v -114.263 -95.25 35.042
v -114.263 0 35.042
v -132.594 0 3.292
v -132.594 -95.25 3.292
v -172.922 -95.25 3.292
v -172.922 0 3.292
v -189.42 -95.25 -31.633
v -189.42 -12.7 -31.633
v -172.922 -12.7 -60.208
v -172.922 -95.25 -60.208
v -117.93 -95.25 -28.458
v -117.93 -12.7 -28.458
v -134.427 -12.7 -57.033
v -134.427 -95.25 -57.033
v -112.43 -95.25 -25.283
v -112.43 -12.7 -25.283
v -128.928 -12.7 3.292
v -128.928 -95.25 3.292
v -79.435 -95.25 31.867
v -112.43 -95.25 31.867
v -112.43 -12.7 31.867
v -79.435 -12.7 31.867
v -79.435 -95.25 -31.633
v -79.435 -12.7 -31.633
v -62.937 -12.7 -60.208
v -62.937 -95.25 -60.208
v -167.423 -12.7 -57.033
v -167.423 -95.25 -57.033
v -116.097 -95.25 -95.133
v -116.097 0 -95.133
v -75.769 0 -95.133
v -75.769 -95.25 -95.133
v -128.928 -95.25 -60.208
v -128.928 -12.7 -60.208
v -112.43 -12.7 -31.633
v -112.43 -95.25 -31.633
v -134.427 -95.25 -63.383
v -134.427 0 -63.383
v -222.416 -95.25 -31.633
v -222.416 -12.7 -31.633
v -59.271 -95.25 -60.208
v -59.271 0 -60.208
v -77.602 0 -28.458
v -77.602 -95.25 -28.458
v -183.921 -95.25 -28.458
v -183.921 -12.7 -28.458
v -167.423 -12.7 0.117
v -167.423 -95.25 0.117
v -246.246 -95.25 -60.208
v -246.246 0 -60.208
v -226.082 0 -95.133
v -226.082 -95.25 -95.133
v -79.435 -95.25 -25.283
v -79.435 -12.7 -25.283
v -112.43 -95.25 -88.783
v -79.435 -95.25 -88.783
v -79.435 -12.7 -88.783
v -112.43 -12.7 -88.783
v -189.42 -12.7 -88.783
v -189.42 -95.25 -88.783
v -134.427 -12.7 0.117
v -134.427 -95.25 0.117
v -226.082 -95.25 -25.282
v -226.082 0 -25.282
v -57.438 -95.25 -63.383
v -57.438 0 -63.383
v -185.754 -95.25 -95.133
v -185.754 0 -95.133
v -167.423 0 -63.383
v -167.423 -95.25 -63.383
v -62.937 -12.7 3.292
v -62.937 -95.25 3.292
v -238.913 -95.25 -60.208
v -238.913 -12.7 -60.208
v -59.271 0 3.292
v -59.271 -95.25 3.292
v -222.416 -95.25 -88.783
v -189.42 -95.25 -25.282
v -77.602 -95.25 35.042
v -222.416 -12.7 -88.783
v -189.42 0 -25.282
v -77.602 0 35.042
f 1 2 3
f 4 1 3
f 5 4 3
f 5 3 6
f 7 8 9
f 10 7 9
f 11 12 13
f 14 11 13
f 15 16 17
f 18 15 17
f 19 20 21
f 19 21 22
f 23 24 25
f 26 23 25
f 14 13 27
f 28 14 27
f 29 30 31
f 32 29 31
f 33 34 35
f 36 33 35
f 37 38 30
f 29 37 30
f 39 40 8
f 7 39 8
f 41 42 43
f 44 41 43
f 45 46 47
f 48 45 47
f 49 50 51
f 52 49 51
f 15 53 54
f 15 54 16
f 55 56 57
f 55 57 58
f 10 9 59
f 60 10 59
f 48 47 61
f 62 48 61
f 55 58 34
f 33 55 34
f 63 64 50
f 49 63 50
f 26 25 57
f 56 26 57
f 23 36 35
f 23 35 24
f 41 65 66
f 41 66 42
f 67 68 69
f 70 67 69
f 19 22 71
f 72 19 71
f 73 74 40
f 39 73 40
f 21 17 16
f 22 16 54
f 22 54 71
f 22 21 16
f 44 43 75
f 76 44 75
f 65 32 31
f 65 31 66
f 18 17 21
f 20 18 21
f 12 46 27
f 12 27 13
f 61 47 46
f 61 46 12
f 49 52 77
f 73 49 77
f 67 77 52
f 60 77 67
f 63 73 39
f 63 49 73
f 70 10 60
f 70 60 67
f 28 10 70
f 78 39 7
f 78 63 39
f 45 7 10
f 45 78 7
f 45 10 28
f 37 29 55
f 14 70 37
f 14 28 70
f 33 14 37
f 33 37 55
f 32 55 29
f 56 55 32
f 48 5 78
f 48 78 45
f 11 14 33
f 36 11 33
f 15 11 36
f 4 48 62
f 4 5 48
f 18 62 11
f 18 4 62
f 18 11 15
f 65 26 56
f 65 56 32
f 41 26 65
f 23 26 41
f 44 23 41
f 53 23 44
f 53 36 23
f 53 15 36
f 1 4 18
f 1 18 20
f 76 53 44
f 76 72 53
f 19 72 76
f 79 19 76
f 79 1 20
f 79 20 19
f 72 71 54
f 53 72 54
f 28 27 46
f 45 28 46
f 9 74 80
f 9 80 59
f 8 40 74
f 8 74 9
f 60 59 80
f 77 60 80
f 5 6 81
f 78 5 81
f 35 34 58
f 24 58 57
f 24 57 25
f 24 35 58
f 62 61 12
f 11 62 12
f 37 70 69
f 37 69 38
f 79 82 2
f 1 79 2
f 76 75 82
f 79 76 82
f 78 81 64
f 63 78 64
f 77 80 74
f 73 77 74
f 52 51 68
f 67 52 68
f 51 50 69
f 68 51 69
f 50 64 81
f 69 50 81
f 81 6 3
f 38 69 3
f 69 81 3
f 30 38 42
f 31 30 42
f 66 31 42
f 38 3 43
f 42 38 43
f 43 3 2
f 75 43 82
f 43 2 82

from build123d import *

# Parameters (mm, degrees)
F1_DEPTH = 12.7
F2_DEPTH = 95.25


# Not quite as in the source:
# - a feature names something its author has since deleted; it is built from what else it names


with BuildPart() as f1:
    # F0 (on Front) → F1 (new body)
    with BuildSketch(Plane.XZ):
        Polygon((-187.5869779497, -91.9575006988), (-169.2561069029, -60.2075006988), (-187.5869779497, -28.4575006988), (-224.2487200432, -28.4575006988), (-242.57959109, -60.2075006988), (-224.2487200432, -91.9575006988), align=None)
        Polygon((-222.4156329385, -88.7825006988), (-238.9134168806, -60.2075006988), (-222.4156329385, -31.6325006988), (-189.4200650544, -31.6325006988), (-172.9222811123, -60.2075006988), (-189.4200650544, -88.7825006988), align=None, mode=Mode.SUBTRACT)
        Polygon((-59.2708806223, -60.2075006988), (-77.6017516691, -28.4575006988), (-114.2634937626, -28.4575006988), (-132.5943648094, -60.2075006988), (-114.2634937626, -91.9575006988), (-77.6017516691, -91.9575006988), align=None)
        Polygon((-112.4304066579, -88.7825006988), (-128.9281906, -60.2075006988), (-112.4304066579, -31.6325006988), (-79.4348387737, -31.6325006988), (-62.9370548316, -60.2075006988), (-79.4348387737, -88.7825006988), align=None, mode=Mode.SUBTRACT)
        Polygon((-77.6017516691, -28.4575006988), (-59.2708806223, 3.2924993012), (-77.6017516691, 35.0424993012), (-114.2634937626, 35.0424993012), (-132.5943648094, 3.2924993012), (-114.2634937626, -28.4575006988), align=None)
        Polygon((-112.4304066579, -25.2825006988), (-128.9281906, 3.2924993012), (-112.4304066579, 31.8674993012), (-79.4348387737, 31.8674993012), (-62.9370548316, 3.2924993012), (-79.4348387737, -25.2825006988), align=None, mode=Mode.SUBTRACT)
        Polygon((-132.5943648094, -60.2075006988), (-114.2634937626, -28.4575006988), (-132.5943648094, 3.2924993012), (-169.2561069029, 3.2924993012), (-187.5869779497, -28.4575006988), (-169.2561069029, -60.2075006988), align=None)
        Polygon((-167.4230197982, -57.0325006988), (-183.9208037403, -28.4575006988), (-167.4230197982, 0.1174993012), (-134.4274519141, 0.1174993012), (-117.929667972, -28.4575006988), (-134.4274519141, -57.0325006988), align=None, mode=Mode.SUBTRACT)
        Polygon((-222.4156329385, -31.6325006988), (-238.9134168806, -60.2075006988), (-222.4156329385, -88.7825006988), (-189.4200650544, -88.7825006988), (-172.9222811123, -60.2075006988), (-189.4200650544, -31.6325006988), align=None)
        Polygon((-112.4304066579, -31.6325006988), (-128.9281906, -60.2075006988), (-112.4304066579, -88.7825006988), (-79.4348387737, -88.7825006988), (-62.9370548316, -60.2075006988), (-79.4348387737, -31.6325006988), align=None)
        Polygon((-167.4230197982, 0.1174993012), (-183.9208037403, -28.4575006988), (-167.4230197982, -57.0325006988), (-134.4274519141, -57.0325006988), (-117.929667972, -28.4575006988), (-134.4274519141, 0.1174993012), align=None)
        Polygon((-112.4304066579, 31.8674993012), (-128.9281906, 3.2924993012), (-112.4304066579, -25.2825006988), (-79.4348387737, -25.2825006988), (-62.9370548316, 3.2924993012), (-79.4348387737, 31.8674993012), align=None)
    extrude(amount=F1_DEPTH)

    # F0 (on Front) → F2 (join)
    with BuildSketch(Plane.XZ):
        Polygon((-77.6017516691, -28.4575006988), (-59.2708806223, 3.2924993012), (-77.6017516691, 35.0424993012), (-114.2634937626, 35.0424993012), (-132.5943648094, 3.2924993012), (-114.2634937626, -28.4575006988), align=None)
        Polygon((-112.4304066579, -25.2825006988), (-128.9281906, 3.2924993012), (-112.4304066579, 31.8674993012), (-79.4348387737, 31.8674993012), (-62.9370548316, 3.2924993012), (-79.4348387737, -25.2825006988), align=None, mode=Mode.SUBTRACT)
        Polygon((-59.2708806223, -60.2075006988), (-77.6017516691, -28.4575006988), (-114.2634937626, -28.4575006988), (-132.5943648094, -60.2075006988), (-114.2634937626, -91.9575006988), (-77.6017516691, -91.9575006988), align=None)
        Polygon((-112.4304066579, -88.7825006988), (-128.9281906, -60.2075006988), (-112.4304066579, -31.6325006988), (-79.4348387737, -31.6325006988), (-62.9370548316, -60.2075006988), (-79.4348387737, -88.7825006988), align=None, mode=Mode.SUBTRACT)
        Polygon((-132.5943648094, -60.2075006988), (-114.2634937626, -28.4575006988), (-132.5943648094, 3.2924993012), (-169.2561069029, 3.2924993012), (-187.5869779497, -28.4575006988), (-169.2561069029, -60.2075006988), align=None)
        Polygon((-167.4230197982, -57.0325006988), (-183.9208037403, -28.4575006988), (-167.4230197982, 0.1174993012), (-134.4274519141, 0.1174993012), (-117.929667972, -28.4575006988), (-134.4274519141, -57.0325006988), align=None, mode=Mode.SUBTRACT)
        Polygon((-187.5869779497, -91.9575006988), (-169.2561069029, -60.2075006988), (-187.5869779497, -28.4575006988), (-224.2487200432, -28.4575006988), (-242.57959109, -60.2075006988), (-224.2487200432, -91.9575006988), align=None)
        Polygon((-222.4156329385, -88.7825006988), (-238.9134168806, -60.2075006988), (-222.4156329385, -31.6325006988), (-189.4200650544, -31.6325006988), (-172.9222811123, -60.2075006988), (-189.4200650544, -88.7825006988), align=None, mode=Mode.SUBTRACT)
        Polygon((-57.4378374826, -63.3825006988), (-59.2708806223, -60.2075006988), (-77.6017516691, -91.9575006988), (-114.2634937626, -91.9575006988), (-132.5943648094, -60.2075006988), (-169.2561069029, -60.2075006988), (-187.5869779497, -91.9575006988), (-224.2487200432, -91.9575006988), (-242.57959109, -60.2075006988), (-224.2487200432, -28.4575006988), (-187.5869779497, -28.4575006988), (-169.2561069029, 3.2924993012), (-172.9222811123, 3.2924993012), (-189.4200540638, -25.2824816625), (-226.0817961573, -25.2824816625), (-246.24577629, -60.2075197352), (-226.0817961573, -95.1325578078), (-185.7539677819, -95.1325578078), (-167.4230967351, -63.3825578078), (-134.4273749772, -63.3825578078), (-116.0965039304, -95.1325578078), (-75.7687415012, -95.1325578078), align=None)
    extrude(amount=F2_DEPTH)


solid = f1.part
